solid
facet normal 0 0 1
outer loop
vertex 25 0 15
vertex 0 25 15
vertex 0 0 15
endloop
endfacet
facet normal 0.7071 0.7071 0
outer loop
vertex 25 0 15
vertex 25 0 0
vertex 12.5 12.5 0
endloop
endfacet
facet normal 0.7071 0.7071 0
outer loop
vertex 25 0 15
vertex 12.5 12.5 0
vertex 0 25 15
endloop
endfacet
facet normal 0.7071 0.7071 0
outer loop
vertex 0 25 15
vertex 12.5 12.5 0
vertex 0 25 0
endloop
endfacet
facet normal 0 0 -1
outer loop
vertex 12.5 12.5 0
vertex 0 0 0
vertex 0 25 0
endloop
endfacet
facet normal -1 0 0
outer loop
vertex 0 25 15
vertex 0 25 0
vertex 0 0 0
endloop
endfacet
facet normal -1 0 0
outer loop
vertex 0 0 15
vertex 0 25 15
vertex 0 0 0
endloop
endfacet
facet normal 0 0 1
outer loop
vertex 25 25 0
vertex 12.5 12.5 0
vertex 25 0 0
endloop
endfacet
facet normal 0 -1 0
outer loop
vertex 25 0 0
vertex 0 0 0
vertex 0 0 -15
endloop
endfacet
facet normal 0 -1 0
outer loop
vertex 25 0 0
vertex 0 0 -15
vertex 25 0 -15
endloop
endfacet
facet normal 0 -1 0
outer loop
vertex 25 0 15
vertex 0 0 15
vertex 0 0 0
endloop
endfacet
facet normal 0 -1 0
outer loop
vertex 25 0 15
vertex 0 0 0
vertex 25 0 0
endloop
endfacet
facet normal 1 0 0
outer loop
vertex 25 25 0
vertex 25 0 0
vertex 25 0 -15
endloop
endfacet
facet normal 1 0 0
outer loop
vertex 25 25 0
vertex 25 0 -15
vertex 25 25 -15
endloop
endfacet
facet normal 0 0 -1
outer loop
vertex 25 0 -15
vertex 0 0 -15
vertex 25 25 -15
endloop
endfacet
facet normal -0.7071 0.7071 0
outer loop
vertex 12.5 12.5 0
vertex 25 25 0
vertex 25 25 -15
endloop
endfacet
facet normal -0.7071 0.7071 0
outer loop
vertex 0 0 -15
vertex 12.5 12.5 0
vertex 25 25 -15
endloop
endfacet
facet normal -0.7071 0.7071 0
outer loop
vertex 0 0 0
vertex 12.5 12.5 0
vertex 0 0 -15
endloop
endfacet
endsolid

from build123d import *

# Parameters (mm, degrees)
BOSS_EXTRUDE1_DEPTH = 15
BOSS_EXTRUDE2_DEPTH = 15


with BuildPart() as part:
    # Sketch1 → Boss-Extrude1 (new body)
    with BuildSketch(Plane.XY):
        Polygon((0, 25), (0, 0), (25, 0), align=None)
    extrude(amount=BOSS_EXTRUDE1_DEPTH)

    # Sketch2 → Boss-Extrude2 (add)
    with BuildSketch(Plane(origin=(0, 0, 0), x_dir=(-1, 0, 0), z_dir=(0, 0, -1))):
        Polygon((-25, 0), (-25, 25), (0, 0), align=None)
    extrude(amount=BOSS_EXTRUDE2_DEPTH)


solid = part.part
